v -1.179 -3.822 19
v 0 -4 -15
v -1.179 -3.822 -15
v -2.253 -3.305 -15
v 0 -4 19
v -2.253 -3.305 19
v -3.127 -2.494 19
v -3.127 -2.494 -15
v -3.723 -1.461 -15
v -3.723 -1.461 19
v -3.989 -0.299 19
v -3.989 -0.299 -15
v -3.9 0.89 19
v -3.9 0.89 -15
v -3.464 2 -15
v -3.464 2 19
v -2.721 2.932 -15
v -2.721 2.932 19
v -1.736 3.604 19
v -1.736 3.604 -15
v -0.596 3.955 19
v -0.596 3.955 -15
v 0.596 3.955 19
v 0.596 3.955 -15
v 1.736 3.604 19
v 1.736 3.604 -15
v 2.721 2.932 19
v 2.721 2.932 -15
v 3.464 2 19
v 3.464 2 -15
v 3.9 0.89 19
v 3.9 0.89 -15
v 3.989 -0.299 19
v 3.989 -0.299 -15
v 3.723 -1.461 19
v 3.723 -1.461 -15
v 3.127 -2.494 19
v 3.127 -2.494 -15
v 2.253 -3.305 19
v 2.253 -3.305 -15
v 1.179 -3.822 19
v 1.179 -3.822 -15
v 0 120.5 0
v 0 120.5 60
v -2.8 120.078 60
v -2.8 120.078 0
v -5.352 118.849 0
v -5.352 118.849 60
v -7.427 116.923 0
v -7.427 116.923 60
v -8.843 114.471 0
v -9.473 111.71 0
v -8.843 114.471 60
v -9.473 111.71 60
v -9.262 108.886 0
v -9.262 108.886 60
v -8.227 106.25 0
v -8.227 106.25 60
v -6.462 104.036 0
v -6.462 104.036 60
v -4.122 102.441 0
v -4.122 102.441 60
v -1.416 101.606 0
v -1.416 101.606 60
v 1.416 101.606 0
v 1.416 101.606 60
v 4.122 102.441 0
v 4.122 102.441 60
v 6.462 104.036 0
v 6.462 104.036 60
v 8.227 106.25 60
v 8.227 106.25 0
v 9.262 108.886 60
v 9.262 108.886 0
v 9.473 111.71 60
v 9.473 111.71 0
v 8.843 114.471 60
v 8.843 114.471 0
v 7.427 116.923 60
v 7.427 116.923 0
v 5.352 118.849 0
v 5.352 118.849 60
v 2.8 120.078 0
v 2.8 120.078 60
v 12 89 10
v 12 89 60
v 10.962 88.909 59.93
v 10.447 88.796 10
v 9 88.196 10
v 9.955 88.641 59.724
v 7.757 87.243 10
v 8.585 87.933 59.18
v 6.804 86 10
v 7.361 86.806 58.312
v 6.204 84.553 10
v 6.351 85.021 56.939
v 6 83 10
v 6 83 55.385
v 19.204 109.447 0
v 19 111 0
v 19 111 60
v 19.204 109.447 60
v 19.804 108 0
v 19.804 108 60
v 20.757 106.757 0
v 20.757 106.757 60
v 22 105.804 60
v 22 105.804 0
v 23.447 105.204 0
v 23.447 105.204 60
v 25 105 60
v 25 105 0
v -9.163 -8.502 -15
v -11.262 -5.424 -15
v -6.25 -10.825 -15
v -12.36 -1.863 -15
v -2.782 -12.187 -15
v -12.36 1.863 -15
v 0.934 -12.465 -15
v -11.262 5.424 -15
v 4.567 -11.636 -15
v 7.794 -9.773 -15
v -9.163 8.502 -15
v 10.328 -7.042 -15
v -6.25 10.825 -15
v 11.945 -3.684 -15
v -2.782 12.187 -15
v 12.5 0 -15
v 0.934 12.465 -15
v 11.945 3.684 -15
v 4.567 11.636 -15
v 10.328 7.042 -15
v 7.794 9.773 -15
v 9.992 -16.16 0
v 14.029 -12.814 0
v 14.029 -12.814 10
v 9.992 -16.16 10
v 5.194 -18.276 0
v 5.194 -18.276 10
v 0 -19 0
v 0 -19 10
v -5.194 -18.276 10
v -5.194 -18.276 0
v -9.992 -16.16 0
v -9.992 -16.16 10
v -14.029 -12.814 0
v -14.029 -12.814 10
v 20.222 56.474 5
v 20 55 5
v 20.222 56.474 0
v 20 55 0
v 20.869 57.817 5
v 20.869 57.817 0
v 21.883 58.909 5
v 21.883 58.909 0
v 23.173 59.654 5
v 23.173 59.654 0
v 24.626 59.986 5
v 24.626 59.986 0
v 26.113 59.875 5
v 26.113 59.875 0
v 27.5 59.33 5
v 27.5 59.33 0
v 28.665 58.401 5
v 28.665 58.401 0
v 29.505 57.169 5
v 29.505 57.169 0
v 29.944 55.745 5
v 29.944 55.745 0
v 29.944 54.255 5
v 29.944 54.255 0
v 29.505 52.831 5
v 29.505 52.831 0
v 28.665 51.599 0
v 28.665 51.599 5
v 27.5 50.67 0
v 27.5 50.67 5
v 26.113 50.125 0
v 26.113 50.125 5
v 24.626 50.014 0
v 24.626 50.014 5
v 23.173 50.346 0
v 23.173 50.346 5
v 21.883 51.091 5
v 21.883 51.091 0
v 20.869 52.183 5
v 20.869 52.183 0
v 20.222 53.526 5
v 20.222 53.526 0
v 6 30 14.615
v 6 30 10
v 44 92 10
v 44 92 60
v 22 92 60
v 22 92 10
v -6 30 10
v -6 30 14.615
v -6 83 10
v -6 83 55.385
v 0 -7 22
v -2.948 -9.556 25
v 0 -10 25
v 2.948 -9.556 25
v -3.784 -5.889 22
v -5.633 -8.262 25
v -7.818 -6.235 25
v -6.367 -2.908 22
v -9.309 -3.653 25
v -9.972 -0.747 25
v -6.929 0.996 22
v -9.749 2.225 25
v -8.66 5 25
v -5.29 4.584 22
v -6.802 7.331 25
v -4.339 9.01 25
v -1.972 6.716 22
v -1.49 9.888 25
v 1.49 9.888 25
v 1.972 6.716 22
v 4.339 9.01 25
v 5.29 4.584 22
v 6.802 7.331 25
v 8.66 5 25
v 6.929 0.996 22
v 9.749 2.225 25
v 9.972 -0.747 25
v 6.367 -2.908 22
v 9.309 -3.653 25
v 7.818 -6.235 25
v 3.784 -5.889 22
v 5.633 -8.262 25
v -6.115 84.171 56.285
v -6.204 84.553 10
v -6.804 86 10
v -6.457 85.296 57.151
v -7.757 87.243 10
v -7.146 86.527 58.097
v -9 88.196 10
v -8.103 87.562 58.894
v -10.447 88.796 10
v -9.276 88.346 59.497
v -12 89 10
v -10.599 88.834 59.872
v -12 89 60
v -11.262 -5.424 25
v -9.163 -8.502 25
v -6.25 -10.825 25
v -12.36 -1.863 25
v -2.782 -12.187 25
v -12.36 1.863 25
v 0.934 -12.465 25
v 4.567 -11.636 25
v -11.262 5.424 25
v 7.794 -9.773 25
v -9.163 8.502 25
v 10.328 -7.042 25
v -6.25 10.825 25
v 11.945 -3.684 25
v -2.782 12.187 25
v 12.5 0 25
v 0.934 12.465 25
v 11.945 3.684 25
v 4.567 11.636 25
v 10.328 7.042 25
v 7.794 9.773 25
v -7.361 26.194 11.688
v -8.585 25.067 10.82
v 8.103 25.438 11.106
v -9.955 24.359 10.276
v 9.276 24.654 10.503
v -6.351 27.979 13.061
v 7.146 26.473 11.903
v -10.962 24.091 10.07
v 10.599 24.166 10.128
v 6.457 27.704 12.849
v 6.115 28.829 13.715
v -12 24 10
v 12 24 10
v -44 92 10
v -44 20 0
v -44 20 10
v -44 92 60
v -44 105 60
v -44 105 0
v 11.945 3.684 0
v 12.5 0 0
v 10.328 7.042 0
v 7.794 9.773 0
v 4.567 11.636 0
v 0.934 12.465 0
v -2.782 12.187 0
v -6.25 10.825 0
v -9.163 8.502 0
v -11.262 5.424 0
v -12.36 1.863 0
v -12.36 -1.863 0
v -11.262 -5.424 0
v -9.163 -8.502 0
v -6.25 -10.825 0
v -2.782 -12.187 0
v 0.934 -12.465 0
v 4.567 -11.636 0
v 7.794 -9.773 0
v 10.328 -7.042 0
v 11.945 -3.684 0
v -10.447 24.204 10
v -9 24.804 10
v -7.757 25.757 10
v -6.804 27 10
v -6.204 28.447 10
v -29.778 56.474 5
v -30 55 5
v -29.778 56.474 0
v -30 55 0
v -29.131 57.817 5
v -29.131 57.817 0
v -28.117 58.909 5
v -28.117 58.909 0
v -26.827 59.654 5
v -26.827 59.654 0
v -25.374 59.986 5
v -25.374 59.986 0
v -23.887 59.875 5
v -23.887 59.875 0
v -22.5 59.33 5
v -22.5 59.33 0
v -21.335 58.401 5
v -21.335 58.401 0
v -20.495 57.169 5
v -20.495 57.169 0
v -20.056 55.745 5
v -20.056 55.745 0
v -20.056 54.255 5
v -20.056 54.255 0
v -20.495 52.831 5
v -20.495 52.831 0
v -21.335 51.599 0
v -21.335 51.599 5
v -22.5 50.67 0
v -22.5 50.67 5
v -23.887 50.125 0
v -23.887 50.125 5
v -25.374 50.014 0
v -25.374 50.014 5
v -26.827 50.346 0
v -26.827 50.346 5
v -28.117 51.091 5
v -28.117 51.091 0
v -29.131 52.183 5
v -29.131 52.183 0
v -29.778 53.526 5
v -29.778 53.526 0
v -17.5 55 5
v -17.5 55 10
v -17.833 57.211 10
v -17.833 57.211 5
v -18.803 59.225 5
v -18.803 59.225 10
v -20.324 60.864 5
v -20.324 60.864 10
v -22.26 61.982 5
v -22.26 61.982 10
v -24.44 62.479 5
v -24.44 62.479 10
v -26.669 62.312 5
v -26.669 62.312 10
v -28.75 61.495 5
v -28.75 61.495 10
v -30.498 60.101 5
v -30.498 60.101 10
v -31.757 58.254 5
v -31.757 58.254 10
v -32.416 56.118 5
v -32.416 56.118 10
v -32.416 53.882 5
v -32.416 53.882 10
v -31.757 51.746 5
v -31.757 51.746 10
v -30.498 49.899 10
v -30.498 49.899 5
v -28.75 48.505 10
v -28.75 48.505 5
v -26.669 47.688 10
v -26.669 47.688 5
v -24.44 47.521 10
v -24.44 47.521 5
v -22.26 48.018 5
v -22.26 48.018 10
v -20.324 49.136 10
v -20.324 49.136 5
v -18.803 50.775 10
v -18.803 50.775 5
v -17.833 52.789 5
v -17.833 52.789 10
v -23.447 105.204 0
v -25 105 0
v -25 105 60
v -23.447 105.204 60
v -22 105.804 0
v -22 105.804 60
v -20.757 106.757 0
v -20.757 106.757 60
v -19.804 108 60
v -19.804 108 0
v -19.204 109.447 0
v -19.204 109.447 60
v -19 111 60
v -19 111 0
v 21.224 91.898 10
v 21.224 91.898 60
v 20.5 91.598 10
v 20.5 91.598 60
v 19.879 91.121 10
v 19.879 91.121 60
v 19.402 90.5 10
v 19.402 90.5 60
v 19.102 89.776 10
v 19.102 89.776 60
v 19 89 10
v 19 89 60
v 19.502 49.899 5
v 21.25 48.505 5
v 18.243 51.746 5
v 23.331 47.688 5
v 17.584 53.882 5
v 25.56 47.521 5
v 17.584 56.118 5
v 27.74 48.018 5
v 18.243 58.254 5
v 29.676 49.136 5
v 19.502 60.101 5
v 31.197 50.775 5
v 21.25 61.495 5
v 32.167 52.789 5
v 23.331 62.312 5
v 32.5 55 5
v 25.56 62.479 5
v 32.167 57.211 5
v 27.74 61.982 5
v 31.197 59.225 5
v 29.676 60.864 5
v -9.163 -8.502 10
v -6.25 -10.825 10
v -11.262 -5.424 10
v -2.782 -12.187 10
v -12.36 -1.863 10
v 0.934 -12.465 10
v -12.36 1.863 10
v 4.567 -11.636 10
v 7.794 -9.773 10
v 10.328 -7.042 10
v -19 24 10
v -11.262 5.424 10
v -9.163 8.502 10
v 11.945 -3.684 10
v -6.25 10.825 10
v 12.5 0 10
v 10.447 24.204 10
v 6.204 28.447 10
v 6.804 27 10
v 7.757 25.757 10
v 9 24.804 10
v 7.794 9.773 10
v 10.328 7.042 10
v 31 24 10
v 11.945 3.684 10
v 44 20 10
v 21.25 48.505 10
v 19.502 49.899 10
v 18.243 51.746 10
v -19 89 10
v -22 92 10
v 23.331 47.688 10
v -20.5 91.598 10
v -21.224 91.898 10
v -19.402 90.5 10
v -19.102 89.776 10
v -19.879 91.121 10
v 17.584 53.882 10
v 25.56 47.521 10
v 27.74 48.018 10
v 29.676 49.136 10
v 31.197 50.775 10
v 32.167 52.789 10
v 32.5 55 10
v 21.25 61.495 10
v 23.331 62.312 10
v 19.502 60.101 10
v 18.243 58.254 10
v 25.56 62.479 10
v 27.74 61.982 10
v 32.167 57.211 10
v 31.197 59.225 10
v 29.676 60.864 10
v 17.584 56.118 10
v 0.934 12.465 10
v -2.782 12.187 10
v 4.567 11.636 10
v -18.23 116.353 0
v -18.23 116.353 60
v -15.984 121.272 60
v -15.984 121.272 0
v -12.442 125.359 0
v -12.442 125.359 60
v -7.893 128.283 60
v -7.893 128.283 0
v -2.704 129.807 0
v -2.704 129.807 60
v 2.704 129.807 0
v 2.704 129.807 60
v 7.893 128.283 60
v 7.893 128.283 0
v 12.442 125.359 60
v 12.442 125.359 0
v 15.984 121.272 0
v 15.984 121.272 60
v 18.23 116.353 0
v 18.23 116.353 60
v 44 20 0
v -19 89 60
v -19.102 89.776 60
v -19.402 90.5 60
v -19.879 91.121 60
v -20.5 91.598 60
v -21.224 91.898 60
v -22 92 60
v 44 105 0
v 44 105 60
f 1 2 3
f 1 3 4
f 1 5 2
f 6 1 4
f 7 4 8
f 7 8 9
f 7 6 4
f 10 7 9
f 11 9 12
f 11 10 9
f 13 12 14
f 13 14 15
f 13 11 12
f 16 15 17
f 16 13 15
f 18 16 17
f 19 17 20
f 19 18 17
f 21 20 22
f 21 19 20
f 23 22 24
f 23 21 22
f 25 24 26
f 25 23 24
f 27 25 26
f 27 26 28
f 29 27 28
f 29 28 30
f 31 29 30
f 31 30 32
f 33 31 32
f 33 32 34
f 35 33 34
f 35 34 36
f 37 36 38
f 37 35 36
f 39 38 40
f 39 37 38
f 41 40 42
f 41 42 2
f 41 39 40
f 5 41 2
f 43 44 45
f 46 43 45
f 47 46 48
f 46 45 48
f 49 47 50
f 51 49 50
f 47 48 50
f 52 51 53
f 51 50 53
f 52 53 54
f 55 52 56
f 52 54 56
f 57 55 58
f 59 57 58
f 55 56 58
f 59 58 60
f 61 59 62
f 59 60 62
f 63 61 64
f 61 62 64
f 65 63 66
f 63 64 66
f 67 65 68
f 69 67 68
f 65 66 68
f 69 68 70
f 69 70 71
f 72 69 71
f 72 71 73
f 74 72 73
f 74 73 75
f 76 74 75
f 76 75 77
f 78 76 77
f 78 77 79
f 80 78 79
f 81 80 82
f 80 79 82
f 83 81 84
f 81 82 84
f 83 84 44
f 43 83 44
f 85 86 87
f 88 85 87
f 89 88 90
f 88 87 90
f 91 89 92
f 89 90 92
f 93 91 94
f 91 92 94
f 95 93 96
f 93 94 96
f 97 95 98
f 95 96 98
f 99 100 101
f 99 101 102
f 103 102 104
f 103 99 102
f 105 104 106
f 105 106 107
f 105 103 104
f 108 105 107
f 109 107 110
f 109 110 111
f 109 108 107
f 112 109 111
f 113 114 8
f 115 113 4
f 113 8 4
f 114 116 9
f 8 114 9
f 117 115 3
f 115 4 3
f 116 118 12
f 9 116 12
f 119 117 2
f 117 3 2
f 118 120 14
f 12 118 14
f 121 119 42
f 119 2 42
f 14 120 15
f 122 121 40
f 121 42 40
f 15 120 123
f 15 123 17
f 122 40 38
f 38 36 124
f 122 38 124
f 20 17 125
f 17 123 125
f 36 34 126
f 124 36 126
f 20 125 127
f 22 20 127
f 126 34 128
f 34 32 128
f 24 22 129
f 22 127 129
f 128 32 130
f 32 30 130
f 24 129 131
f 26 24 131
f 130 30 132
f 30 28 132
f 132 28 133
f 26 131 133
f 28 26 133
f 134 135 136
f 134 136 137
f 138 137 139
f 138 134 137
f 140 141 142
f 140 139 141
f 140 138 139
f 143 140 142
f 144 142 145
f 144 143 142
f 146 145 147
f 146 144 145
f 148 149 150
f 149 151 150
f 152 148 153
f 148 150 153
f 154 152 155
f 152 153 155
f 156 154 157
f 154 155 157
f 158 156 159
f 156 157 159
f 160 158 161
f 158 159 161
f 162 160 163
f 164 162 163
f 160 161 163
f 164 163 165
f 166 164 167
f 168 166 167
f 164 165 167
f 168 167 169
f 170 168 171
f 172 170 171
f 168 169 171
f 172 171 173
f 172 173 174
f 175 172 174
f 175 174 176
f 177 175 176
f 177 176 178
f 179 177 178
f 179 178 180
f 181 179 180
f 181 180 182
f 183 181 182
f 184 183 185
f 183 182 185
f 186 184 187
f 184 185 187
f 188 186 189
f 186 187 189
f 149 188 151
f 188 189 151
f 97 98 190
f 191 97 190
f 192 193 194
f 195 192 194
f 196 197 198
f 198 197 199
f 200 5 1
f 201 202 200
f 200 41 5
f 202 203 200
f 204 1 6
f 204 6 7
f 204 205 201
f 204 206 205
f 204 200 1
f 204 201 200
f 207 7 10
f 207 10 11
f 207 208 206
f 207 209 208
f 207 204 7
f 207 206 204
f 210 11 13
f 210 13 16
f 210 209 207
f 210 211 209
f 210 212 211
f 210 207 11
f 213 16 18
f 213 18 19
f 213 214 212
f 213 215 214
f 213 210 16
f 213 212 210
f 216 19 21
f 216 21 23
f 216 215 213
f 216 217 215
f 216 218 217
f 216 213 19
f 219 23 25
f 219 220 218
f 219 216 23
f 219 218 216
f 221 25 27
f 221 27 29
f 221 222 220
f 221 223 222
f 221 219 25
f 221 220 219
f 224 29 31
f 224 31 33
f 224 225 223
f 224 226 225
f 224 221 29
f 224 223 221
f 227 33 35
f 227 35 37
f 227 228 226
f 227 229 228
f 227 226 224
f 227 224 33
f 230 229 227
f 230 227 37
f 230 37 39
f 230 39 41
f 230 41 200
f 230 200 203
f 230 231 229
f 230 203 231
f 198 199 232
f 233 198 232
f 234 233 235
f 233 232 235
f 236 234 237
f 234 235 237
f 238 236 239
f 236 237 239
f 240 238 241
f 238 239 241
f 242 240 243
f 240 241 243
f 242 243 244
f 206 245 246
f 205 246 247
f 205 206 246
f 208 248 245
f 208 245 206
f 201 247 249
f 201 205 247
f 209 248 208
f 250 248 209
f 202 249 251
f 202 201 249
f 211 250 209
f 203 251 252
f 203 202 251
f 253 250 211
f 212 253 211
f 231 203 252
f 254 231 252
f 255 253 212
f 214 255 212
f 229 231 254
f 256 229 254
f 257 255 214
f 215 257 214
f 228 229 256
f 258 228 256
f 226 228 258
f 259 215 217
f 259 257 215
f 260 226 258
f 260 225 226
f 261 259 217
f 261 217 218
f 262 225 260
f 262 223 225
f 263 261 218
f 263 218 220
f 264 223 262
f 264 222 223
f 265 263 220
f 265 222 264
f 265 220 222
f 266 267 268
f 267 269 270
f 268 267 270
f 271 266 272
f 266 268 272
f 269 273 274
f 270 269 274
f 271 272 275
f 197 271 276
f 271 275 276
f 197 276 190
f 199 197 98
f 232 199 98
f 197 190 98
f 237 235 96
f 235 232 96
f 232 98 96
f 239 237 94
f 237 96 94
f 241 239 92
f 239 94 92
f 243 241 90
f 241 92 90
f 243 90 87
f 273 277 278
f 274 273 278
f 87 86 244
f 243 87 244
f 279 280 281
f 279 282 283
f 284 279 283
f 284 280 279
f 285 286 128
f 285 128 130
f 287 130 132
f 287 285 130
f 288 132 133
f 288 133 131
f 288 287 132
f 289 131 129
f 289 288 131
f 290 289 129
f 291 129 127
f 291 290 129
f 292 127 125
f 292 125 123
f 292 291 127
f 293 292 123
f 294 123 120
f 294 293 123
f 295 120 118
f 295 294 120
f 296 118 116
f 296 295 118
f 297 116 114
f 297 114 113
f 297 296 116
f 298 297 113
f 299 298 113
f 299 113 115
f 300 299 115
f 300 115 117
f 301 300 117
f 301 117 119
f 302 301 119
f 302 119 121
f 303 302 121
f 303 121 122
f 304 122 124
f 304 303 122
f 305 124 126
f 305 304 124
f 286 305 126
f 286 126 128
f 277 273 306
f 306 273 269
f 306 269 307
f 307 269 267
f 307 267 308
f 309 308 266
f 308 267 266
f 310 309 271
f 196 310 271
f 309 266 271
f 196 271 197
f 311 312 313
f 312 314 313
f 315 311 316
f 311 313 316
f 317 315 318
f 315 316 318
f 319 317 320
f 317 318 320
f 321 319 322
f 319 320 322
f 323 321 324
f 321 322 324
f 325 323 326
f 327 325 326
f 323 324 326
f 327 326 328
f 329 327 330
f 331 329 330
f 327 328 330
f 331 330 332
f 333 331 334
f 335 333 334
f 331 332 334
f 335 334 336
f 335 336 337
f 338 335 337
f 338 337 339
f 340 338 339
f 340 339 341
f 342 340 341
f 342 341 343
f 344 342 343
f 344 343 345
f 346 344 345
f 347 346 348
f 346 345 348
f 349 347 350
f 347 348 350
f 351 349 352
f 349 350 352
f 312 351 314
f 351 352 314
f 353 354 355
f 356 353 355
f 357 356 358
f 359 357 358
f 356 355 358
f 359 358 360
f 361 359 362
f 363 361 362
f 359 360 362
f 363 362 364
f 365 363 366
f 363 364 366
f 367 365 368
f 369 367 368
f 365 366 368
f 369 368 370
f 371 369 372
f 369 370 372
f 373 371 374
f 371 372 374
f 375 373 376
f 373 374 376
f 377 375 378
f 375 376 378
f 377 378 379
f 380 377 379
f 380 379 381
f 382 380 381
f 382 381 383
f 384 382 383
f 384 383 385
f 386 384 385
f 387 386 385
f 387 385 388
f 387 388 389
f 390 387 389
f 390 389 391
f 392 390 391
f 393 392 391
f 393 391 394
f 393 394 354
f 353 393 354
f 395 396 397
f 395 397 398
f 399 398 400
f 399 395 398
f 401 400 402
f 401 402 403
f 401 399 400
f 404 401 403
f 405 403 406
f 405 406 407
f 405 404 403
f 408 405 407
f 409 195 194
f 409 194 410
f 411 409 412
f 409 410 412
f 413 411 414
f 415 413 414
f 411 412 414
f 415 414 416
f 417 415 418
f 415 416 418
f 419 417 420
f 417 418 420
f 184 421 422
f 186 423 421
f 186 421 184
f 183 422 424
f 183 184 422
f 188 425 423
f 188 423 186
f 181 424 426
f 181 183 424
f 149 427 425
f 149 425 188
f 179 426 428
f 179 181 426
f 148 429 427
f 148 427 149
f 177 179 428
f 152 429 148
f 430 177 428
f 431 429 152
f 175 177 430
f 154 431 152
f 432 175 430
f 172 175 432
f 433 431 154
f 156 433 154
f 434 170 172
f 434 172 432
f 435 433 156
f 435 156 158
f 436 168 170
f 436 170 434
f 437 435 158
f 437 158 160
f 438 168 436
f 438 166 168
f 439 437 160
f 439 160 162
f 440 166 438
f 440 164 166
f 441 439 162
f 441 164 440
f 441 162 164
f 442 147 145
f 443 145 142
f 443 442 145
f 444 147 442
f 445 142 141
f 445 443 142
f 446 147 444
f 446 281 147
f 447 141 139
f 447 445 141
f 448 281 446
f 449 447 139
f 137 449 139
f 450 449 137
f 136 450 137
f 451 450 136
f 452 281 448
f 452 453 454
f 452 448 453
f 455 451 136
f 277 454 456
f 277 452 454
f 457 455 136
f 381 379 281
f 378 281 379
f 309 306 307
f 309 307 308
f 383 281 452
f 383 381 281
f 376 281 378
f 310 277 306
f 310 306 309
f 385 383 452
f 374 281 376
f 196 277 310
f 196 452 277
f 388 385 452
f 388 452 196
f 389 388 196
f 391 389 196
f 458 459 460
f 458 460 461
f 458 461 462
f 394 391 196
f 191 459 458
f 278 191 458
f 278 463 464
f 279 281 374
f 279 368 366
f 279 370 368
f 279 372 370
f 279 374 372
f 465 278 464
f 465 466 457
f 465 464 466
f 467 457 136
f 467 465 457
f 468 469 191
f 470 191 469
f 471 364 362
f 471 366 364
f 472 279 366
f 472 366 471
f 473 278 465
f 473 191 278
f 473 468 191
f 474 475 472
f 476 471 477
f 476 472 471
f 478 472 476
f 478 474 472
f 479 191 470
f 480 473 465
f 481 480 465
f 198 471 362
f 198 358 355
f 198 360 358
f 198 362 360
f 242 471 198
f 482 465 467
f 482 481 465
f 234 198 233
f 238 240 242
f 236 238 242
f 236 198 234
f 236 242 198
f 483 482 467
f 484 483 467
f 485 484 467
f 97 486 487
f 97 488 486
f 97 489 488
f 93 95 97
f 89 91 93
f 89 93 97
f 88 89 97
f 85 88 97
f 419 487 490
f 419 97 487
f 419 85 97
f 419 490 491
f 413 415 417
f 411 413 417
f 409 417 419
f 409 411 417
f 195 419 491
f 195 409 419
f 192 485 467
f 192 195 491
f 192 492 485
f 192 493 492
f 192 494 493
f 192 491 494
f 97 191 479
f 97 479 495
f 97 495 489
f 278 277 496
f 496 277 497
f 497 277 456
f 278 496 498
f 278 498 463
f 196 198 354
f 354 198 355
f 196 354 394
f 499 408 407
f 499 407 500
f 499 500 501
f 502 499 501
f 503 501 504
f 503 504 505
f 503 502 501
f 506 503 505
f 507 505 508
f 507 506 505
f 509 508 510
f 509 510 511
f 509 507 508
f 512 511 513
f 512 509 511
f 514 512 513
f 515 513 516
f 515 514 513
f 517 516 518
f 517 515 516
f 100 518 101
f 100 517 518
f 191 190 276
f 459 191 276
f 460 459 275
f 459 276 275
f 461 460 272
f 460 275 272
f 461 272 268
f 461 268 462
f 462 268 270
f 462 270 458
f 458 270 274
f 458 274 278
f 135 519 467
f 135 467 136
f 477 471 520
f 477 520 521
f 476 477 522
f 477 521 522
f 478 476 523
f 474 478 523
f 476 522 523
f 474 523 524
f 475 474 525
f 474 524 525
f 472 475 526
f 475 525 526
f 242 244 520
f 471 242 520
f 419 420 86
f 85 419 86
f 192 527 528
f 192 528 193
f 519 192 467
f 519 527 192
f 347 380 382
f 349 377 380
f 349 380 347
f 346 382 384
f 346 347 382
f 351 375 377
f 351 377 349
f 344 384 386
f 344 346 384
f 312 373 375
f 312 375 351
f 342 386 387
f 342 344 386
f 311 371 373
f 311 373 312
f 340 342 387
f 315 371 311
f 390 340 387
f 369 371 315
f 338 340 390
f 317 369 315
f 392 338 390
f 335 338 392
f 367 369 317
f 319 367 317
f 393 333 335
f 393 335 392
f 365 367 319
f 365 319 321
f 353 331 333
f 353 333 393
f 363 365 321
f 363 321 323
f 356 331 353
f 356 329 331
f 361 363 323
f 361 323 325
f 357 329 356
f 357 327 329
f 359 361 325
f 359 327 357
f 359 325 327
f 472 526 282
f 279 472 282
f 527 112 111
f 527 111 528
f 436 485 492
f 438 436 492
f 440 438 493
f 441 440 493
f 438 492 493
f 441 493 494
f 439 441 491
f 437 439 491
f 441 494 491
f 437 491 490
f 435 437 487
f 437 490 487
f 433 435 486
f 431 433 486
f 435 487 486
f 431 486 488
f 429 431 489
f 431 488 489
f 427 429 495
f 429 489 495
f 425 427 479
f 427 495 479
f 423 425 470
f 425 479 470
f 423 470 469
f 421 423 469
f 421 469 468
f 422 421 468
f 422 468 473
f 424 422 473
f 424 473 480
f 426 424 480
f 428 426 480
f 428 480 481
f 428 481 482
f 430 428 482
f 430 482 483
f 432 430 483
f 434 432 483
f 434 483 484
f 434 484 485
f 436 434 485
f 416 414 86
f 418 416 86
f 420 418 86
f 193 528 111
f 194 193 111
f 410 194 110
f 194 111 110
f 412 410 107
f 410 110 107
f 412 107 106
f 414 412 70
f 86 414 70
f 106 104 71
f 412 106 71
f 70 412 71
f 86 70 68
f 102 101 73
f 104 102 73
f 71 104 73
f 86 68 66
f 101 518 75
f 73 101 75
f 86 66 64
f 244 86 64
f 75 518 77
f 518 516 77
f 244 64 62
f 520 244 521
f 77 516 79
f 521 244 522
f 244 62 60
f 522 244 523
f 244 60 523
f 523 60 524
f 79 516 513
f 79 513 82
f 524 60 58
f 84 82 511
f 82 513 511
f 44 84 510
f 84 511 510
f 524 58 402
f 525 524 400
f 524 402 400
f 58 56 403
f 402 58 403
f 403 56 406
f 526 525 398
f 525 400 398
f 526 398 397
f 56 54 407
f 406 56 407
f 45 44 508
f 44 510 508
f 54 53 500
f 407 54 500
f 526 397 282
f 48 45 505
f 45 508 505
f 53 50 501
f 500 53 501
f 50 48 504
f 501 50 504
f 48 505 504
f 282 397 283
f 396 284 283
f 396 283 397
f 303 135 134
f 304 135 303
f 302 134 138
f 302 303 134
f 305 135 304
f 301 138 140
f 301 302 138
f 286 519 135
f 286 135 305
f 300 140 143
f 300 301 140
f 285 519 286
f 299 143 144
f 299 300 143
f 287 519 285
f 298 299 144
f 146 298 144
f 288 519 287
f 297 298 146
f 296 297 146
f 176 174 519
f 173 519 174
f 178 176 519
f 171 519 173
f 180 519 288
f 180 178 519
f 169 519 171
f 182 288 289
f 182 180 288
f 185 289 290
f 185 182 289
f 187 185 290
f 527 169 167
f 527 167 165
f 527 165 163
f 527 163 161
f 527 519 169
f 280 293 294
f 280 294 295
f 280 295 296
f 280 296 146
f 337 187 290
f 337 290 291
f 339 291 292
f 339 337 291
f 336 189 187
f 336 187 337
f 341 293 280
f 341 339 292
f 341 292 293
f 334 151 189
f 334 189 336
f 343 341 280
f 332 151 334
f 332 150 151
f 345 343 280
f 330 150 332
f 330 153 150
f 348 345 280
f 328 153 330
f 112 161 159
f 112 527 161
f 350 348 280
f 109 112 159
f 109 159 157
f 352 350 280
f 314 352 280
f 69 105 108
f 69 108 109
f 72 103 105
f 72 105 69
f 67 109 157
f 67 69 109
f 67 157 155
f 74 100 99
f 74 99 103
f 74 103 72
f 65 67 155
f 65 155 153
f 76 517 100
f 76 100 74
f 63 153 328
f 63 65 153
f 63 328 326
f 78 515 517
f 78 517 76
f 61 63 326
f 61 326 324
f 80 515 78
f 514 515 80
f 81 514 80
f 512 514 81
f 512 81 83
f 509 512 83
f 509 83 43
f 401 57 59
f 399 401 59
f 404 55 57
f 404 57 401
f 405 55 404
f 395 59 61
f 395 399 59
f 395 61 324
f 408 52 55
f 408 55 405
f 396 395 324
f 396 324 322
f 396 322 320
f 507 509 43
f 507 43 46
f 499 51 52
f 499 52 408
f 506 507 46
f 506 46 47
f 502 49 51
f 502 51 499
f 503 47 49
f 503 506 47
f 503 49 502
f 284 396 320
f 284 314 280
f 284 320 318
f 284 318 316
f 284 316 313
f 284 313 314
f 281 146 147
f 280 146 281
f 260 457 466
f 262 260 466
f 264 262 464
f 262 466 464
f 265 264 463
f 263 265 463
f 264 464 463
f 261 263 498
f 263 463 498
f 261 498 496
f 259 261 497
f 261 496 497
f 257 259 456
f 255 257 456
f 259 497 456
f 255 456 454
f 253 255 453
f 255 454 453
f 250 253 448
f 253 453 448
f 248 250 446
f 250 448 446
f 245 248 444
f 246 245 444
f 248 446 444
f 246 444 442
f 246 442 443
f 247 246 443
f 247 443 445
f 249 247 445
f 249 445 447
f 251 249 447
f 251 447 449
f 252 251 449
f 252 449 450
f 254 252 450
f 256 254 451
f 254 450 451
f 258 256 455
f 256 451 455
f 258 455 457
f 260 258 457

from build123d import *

# Parameters (mm, degrees)
BOSS_EXTRUDE6_DEPTH                          = 60
CUT_EXTRUDE3_DEPTH                           = 1
CUT_EXTRUDE3_DEPTH_BACK                      = 50
BOSS_EXTRUDE9_DEPTH                          = 50
CUT_EXTRUDE7_DEPTH                           = 25
CBORE_FOR_M8_HEX_HEAD_CAP_SCREW3_D           = 10
CBORE_FOR_M8_HEX_HEAD_CAP_SCREW3_DEPTH       = 10
CBORE_FOR_M8_HEX_HEAD_CAP_SCREW3_CBORE_D     = 15
CBORE_FOR_M8_HEX_HEAD_CAP_SCREW3_CBORE_DEPTH = 5
CBORE_FOR_M8_HEX_HEAD_CAP_SCREW3_TIP         = 3.004303095
CUT_EXTRUDE8_DEPTH                           = 60
SKETCH29_R                                   = 12.5
BOSS_EXTRUDE10_DEPTH                         = 15
SKETCH2_10_R                                 = 12.5
BOSS_EXTRUDE11_DEPTH                         = 15
BOSS_EXTRUDE8_DEPTH                          = 50
CUT_EXTRUDE5_DEPTH                           = 25
CUT_EXTRUDE6_DEPTH                           = 60


with BuildPart() as part:
    # Sketch2 → Boss-Extrude6 (new body)
    with BuildSketch(Plane.XY):
        with BuildLine():
            Line((44, 20), (14.028925254, -12.813635558))
            ThreePointArc((14.028925254, -12.813635558), (0, -19), (-14.028925254, -12.813635558))
            Line((-14.028925254, -12.813635558), (-44, 20))
            Line((-44, 20), (-44, 105))
            Line((-44, 105), (-25, 105))
            ThreePointArc((-25, 105), (-20.757359313, 106.757359313), (-19, 111))
            ThreePointArc((-19, 111), (0, 130), (19, 111))
            ThreePointArc((19, 111), (20.757359313, 106.757359313), (25, 105))
            Line((25, 105), (44, 105))
            Line((44, 105), (44, 20))
        make_face()
    extrude(amount=BOSS_EXTRUDE6_DEPTH)

    # Sketch5 → Cut-Extrude3 (cut, two sides)
    with BuildSketch(Plane.XY.offset(60)) as cut_extrude3_sk:
        with BuildLine():
            Line((14.028925254, -12.813635558), (44, 20))
            Line((44, 20), (44, 92))
            Line((44, 92), (22, 92))
            ThreePointArc((22, 92), (19.878679656, 91.121320344), (19, 89))
            Line((19, 89), (-19, 89))
            ThreePointArc((-19, 89), (-19.878679656, 91.121320344), (-22, 92))
            Line((-22, 92), (-44, 92))
            Line((-44, 92), (-44, 20))
            Line((-44, 20), (-14.028925254, -12.813635558))
            ThreePointArc((-14.028925254, -12.813635558), (0, -19), (14.028925254, -12.813635558))
        make_face()
    extrude(amount=CUT_EXTRUDE3_DEPTH, mode=Mode.SUBTRACT)
    extrude(cut_extrude3_sk.sketch, amount=-CUT_EXTRUDE3_DEPTH_BACK, mode=Mode.SUBTRACT)

    # Sketch5<11> → Boss-Extrude9 (add)
    with BuildSketch(Plane.XY.offset(60)):
        with BuildLine():
            ThreePointArc((-6, 83), (-7.757359313, 87.242640687), (-12, 89))
            Line((-12, 89), (12, 89))
            ThreePointArc((12, 89), (7.757359313, 87.242640687), (6, 83))
            Line((6, 83), (6, 30))
            ThreePointArc((6, 30), (7.757359313, 25.757359313), (12, 24))
            Line((12, 24), (9.5, 24))
            Line((9.5, 24), (-9.5, 24))
            Line((-9.5, 24), (-12, 24))
            ThreePointArc((-12, 24), (-7.757359313, 25.757359313), (-6, 30))
            Line((-6, 30), (-6, 83))
        make_face()
    extrude(amount=-BOSS_EXTRUDE9_DEPTH)

    # Sketch25 → Cut-Extrude7 (cut, symmetric)
    with BuildSketch(Plane(origin=(6, 0, 0), x_dir=(0, 0, -1), z_dir=(1, 0, 0))):
        Polygon((-60, 89), (-10, 24), (-60, 24), (-60, 30), (-60, 83), align=None)
    extrude(amount=CUT_EXTRUDE7_DEPTH, both=True, mode=Mode.SUBTRACT)

    # CBORE for M8 Hex Head Cap Screw3
    with Locations(Plane(origin=(-25, 55, 10), x_dir=(1, 0, 0), z_dir=(0, 0, 1))):
        with Locations((0, 0), (50, 0)):
            CounterBoreHole(CBORE_FOR_M8_HEX_HEAD_CAP_SCREW3_D / 2, CBORE_FOR_M8_HEX_HEAD_CAP_SCREW3_CBORE_D / 2, CBORE_FOR_M8_HEX_HEAD_CAP_SCREW3_CBORE_DEPTH, depth=CBORE_FOR_M8_HEX_HEAD_CAP_SCREW3_DEPTH)
            with Locations((0, 0, -(CBORE_FOR_M8_HEX_HEAD_CAP_SCREW3_DEPTH + CBORE_FOR_M8_HEX_HEAD_CAP_SCREW3_TIP / 2))):  # 118° drill point
                Cone(0, CBORE_FOR_M8_HEX_HEAD_CAP_SCREW3_D / 2, CBORE_FOR_M8_HEX_HEAD_CAP_SCREW3_TIP, mode=Mode.SUBTRACT)

    # Sketch28 → Cut-Extrude8 (cut)
    with BuildSketch(Plane.XY.offset(60)):
        with BuildLine():
            ThreePointArc((0, 101.5), (9.5, 111), (0, 120.5))
            ThreePointArc((0, 120.5), (-9.5, 111), (0, 101.5))
        make_face()
    extrude(amount=-CUT_EXTRUDE8_DEPTH, mode=Mode.SUBTRACT)

    # Sketch29 → Boss-Extrude10 (add)
    with BuildSketch(Plane.XY.offset(10)):
        Circle(SKETCH29_R)
    extrude(amount=BOSS_EXTRUDE10_DEPTH)

    # Sketch2<10> → Boss-Extrude11 (add)
    with BuildSketch(Plane.XY):
        Circle(SKETCH2_10_R)
    extrude(amount=-BOSS_EXTRUDE11_DEPTH)

    # Sketch5<9> → Boss-Extrude8 (add)
    with BuildSketch(Plane.XY.offset(60)):
        with BuildLine():
            ThreePointArc((-6, 83), (-7.757359313, 87.242640687), (-12, 89))
            Line((-12, 89), (12, 89))
            ThreePointArc((12, 89), (7.757359313, 87.242640687), (6, 83))
            Line((6, 83), (6, 30))
            ThreePointArc((6, 30), (7.757359313, 25.757359313), (12, 24))
            Line((12, 24), (9.5, 24))
            Line((9.5, 24), (-9.5, 24))
            Line((-9.5, 24), (-12, 24))
            ThreePointArc((-12, 24), (-7.757359313, 25.757359313), (-6, 30))
            Line((-6, 30), (-6, 83))
        make_face()
    extrude(amount=-BOSS_EXTRUDE8_DEPTH)

    # Sketch11 → Cut-Extrude5 (cut, symmetric)
    with BuildSketch(Plane(origin=(6, 0, 0), x_dir=(0, 0, -1), z_dir=(1, 0, 0))):
        Polygon((-10, 24), (-60, 89), (-60, 83), (-60, 30), (-60, 24), align=None)
    extrude(amount=CUT_EXTRUDE5_DEPTH, both=True, mode=Mode.SUBTRACT)

    # Sketch34 → CSK for M8 Flat Head Machine Screw2 (revolve, cut)
    with BuildSketch(Plane(origin=(0, 0, 25), x_dir=(0, -1, 0), z_dir=(1, 0, 0))):
        Polygon((0, 0), (0, 42.403442476), (4, 40), (4, 6), (10, 0), align=None)
    revolve(axis=Axis((0, 0, 31.35), (0, 0, -1)), mode=Mode.SUBTRACT)

    # Sketch13 → Cut-Extrude6 (cut)
    with BuildSketch(Plane.XY.offset(60)):
        with BuildLine():
            ThreePointArc((0, 101.5), (9.5, 111), (0, 120.5))
            ThreePointArc((0, 120.5), (-9.5, 111), (0, 101.5))
        make_face()
    extrude(amount=-CUT_EXTRUDE6_DEPTH, mode=Mode.SUBTRACT)


solid = part.part
